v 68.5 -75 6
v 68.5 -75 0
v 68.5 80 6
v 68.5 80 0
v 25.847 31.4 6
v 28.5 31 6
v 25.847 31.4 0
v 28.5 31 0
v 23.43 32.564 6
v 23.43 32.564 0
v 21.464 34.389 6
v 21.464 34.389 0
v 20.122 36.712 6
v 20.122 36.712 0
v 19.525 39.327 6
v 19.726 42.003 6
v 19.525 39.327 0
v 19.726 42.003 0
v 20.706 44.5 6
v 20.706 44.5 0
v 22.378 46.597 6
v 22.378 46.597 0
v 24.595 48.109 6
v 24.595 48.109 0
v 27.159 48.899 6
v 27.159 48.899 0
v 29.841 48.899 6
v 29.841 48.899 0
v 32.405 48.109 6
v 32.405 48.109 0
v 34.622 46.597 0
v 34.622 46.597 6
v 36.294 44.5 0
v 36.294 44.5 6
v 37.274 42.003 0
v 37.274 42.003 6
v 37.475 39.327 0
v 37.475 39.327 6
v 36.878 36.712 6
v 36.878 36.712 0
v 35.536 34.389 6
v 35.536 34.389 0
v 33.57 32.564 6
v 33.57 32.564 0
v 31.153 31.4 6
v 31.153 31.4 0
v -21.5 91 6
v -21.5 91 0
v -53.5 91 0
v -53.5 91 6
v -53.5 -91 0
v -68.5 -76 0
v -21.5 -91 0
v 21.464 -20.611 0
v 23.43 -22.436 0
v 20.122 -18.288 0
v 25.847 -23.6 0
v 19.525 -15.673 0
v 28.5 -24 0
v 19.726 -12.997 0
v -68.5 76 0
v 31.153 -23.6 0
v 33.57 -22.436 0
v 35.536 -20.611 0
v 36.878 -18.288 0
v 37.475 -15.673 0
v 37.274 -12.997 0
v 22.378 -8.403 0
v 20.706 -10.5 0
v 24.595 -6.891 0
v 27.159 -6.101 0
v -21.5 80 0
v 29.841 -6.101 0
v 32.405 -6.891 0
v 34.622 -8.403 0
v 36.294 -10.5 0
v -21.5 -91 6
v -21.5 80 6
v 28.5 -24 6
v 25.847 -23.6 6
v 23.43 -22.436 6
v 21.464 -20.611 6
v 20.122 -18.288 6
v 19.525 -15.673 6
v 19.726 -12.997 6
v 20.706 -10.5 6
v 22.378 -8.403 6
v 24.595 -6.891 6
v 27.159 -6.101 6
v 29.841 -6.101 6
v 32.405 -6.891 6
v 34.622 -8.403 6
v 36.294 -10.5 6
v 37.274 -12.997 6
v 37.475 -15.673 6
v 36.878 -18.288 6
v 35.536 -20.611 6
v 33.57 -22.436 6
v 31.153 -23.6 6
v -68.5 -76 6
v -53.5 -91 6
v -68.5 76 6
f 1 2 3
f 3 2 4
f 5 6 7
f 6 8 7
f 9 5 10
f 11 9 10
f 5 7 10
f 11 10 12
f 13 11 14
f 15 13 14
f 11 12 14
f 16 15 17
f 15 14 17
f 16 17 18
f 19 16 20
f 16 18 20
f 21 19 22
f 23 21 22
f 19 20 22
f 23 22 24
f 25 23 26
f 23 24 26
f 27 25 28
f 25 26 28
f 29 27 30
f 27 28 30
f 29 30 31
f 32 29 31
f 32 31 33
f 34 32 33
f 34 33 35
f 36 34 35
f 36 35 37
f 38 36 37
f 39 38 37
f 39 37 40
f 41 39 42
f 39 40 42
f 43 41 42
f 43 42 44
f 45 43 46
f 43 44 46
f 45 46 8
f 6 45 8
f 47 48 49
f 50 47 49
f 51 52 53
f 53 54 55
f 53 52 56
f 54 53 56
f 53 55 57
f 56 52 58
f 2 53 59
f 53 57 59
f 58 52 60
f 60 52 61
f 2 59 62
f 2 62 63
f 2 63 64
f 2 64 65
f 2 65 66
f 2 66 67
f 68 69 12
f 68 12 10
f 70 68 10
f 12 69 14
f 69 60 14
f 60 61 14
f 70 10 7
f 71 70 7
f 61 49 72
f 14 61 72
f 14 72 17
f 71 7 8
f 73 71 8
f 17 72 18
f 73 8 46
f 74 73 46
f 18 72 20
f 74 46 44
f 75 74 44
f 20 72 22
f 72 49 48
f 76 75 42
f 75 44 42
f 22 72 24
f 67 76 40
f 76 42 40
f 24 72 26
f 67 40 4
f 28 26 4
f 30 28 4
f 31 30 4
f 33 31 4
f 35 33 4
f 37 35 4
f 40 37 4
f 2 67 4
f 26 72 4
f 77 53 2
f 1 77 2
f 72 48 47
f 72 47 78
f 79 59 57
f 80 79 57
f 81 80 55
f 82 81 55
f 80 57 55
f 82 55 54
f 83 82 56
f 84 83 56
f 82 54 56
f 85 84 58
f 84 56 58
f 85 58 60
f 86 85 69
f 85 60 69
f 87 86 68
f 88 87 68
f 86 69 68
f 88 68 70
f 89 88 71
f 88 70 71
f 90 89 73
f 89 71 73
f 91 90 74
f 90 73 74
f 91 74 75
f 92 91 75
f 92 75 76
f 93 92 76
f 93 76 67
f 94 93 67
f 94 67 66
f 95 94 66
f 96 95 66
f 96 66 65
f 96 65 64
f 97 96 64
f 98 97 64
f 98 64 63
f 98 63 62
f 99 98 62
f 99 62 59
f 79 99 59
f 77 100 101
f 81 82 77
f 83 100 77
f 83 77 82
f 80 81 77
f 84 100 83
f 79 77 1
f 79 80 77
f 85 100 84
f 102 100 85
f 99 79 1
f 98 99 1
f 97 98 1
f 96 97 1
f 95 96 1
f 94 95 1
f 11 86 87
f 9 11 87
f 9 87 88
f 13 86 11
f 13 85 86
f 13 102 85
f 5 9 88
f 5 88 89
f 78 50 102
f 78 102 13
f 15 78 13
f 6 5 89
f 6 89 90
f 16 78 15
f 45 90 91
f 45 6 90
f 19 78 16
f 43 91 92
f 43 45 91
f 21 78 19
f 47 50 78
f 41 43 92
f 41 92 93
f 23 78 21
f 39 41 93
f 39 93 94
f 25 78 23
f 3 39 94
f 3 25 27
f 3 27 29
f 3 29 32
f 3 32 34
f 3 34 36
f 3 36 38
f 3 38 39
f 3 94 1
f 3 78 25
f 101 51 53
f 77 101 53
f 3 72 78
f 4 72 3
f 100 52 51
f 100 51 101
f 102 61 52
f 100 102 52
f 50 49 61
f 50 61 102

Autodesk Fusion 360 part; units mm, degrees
sketch "スケッチ1" plane through (0, 0, 0) normal (0, 0, 1) x (1, 0, 0)
  line L0 (-21.5, 91) -> (-68.5, 91)
  line L1 (-68.5, 91) -> (-68.5, -91)
  line L2 (-68.5, -91) -> (-21.5, -91)
  line L3 (68.5, -75) -> (68.5, 80)
  line L4 (60.2198, 80) -> (-68.5, -91) construction
  line L5 (-68.5, 91) -> (57.8776, -76.8884) construction
  line L6 (-21.5, 91) -> (-21.5, 80)
  line L7 (-21.5, 80) -> (68.5, 80)
  line L8 (-68.5, -91) -> (-21.5, -91) construction
  line L9 (-21.5, -91) -> (68.5, -75)
  dimension "d2" = 182
  dimension "d5" = 47
extrude "押し出し1" add sketch "スケッチ1" along normal blind 6
chamfer "面取り1" distance 15 angle 45 2 edges at (-68.5, -91, 3) (-68.5, 91, 3)
sketch "スケッチ2" plane through (0, 0, 6) normal (0, 0, 1) x (-1, 0, 0)
  line L0 (53.5, -91) -> (68.5, -76)
  line L1 (68.5, -76) -> (68.5, 76)
  line L2 (68.5, 76) -> (53.5, 91)
  line L3 (53.5, 91) -> (21.5, 91)
  line L4 (21.5, 91) -> (-68.5, 75)
  line L5 (-68.5, 75) -> (-68.5, -80)
  line L6 (-68.5, -80) -> (21.5, -80)
  line L7 (21.5, -80) -> (21.5, -91)
  line L8 (21.5, -91) -> (53.5, -91)
  line L9 (-68.5, -80) -> (-28.5, -80) construction
  line L10 (-28.5, -80) -> (-28.5, -40) construction
  line L11 (-28.5, -40) -> (-68.5, -40) construction
  line L12 (-68.5, -40) -> (-68.5, -80) construction
  line L13 (-68.5, -40) -> (-28.5, -40) construction
  line L14 (-28.5, -40) -> (-28.5, 15) construction
  line L15 (-28.5, 15) -> (-68.5, 15) construction
  line L16 (-68.5, 15) -> (-68.5, -40) construction
  point P0 (-28.5, -40)
  point P1 (-28.5, 15)
  dimension "d10" = 40
  dimension "d11" = 40
  dimension "d12" = 40
  dimension "d13" = 55
hole "穴1" at (28.5, 40, 6) at (28.5, -15, 6) direction (0, 0, -1) diameter 18 end through all
equation "d5 = 15 mm + 32 mm"
